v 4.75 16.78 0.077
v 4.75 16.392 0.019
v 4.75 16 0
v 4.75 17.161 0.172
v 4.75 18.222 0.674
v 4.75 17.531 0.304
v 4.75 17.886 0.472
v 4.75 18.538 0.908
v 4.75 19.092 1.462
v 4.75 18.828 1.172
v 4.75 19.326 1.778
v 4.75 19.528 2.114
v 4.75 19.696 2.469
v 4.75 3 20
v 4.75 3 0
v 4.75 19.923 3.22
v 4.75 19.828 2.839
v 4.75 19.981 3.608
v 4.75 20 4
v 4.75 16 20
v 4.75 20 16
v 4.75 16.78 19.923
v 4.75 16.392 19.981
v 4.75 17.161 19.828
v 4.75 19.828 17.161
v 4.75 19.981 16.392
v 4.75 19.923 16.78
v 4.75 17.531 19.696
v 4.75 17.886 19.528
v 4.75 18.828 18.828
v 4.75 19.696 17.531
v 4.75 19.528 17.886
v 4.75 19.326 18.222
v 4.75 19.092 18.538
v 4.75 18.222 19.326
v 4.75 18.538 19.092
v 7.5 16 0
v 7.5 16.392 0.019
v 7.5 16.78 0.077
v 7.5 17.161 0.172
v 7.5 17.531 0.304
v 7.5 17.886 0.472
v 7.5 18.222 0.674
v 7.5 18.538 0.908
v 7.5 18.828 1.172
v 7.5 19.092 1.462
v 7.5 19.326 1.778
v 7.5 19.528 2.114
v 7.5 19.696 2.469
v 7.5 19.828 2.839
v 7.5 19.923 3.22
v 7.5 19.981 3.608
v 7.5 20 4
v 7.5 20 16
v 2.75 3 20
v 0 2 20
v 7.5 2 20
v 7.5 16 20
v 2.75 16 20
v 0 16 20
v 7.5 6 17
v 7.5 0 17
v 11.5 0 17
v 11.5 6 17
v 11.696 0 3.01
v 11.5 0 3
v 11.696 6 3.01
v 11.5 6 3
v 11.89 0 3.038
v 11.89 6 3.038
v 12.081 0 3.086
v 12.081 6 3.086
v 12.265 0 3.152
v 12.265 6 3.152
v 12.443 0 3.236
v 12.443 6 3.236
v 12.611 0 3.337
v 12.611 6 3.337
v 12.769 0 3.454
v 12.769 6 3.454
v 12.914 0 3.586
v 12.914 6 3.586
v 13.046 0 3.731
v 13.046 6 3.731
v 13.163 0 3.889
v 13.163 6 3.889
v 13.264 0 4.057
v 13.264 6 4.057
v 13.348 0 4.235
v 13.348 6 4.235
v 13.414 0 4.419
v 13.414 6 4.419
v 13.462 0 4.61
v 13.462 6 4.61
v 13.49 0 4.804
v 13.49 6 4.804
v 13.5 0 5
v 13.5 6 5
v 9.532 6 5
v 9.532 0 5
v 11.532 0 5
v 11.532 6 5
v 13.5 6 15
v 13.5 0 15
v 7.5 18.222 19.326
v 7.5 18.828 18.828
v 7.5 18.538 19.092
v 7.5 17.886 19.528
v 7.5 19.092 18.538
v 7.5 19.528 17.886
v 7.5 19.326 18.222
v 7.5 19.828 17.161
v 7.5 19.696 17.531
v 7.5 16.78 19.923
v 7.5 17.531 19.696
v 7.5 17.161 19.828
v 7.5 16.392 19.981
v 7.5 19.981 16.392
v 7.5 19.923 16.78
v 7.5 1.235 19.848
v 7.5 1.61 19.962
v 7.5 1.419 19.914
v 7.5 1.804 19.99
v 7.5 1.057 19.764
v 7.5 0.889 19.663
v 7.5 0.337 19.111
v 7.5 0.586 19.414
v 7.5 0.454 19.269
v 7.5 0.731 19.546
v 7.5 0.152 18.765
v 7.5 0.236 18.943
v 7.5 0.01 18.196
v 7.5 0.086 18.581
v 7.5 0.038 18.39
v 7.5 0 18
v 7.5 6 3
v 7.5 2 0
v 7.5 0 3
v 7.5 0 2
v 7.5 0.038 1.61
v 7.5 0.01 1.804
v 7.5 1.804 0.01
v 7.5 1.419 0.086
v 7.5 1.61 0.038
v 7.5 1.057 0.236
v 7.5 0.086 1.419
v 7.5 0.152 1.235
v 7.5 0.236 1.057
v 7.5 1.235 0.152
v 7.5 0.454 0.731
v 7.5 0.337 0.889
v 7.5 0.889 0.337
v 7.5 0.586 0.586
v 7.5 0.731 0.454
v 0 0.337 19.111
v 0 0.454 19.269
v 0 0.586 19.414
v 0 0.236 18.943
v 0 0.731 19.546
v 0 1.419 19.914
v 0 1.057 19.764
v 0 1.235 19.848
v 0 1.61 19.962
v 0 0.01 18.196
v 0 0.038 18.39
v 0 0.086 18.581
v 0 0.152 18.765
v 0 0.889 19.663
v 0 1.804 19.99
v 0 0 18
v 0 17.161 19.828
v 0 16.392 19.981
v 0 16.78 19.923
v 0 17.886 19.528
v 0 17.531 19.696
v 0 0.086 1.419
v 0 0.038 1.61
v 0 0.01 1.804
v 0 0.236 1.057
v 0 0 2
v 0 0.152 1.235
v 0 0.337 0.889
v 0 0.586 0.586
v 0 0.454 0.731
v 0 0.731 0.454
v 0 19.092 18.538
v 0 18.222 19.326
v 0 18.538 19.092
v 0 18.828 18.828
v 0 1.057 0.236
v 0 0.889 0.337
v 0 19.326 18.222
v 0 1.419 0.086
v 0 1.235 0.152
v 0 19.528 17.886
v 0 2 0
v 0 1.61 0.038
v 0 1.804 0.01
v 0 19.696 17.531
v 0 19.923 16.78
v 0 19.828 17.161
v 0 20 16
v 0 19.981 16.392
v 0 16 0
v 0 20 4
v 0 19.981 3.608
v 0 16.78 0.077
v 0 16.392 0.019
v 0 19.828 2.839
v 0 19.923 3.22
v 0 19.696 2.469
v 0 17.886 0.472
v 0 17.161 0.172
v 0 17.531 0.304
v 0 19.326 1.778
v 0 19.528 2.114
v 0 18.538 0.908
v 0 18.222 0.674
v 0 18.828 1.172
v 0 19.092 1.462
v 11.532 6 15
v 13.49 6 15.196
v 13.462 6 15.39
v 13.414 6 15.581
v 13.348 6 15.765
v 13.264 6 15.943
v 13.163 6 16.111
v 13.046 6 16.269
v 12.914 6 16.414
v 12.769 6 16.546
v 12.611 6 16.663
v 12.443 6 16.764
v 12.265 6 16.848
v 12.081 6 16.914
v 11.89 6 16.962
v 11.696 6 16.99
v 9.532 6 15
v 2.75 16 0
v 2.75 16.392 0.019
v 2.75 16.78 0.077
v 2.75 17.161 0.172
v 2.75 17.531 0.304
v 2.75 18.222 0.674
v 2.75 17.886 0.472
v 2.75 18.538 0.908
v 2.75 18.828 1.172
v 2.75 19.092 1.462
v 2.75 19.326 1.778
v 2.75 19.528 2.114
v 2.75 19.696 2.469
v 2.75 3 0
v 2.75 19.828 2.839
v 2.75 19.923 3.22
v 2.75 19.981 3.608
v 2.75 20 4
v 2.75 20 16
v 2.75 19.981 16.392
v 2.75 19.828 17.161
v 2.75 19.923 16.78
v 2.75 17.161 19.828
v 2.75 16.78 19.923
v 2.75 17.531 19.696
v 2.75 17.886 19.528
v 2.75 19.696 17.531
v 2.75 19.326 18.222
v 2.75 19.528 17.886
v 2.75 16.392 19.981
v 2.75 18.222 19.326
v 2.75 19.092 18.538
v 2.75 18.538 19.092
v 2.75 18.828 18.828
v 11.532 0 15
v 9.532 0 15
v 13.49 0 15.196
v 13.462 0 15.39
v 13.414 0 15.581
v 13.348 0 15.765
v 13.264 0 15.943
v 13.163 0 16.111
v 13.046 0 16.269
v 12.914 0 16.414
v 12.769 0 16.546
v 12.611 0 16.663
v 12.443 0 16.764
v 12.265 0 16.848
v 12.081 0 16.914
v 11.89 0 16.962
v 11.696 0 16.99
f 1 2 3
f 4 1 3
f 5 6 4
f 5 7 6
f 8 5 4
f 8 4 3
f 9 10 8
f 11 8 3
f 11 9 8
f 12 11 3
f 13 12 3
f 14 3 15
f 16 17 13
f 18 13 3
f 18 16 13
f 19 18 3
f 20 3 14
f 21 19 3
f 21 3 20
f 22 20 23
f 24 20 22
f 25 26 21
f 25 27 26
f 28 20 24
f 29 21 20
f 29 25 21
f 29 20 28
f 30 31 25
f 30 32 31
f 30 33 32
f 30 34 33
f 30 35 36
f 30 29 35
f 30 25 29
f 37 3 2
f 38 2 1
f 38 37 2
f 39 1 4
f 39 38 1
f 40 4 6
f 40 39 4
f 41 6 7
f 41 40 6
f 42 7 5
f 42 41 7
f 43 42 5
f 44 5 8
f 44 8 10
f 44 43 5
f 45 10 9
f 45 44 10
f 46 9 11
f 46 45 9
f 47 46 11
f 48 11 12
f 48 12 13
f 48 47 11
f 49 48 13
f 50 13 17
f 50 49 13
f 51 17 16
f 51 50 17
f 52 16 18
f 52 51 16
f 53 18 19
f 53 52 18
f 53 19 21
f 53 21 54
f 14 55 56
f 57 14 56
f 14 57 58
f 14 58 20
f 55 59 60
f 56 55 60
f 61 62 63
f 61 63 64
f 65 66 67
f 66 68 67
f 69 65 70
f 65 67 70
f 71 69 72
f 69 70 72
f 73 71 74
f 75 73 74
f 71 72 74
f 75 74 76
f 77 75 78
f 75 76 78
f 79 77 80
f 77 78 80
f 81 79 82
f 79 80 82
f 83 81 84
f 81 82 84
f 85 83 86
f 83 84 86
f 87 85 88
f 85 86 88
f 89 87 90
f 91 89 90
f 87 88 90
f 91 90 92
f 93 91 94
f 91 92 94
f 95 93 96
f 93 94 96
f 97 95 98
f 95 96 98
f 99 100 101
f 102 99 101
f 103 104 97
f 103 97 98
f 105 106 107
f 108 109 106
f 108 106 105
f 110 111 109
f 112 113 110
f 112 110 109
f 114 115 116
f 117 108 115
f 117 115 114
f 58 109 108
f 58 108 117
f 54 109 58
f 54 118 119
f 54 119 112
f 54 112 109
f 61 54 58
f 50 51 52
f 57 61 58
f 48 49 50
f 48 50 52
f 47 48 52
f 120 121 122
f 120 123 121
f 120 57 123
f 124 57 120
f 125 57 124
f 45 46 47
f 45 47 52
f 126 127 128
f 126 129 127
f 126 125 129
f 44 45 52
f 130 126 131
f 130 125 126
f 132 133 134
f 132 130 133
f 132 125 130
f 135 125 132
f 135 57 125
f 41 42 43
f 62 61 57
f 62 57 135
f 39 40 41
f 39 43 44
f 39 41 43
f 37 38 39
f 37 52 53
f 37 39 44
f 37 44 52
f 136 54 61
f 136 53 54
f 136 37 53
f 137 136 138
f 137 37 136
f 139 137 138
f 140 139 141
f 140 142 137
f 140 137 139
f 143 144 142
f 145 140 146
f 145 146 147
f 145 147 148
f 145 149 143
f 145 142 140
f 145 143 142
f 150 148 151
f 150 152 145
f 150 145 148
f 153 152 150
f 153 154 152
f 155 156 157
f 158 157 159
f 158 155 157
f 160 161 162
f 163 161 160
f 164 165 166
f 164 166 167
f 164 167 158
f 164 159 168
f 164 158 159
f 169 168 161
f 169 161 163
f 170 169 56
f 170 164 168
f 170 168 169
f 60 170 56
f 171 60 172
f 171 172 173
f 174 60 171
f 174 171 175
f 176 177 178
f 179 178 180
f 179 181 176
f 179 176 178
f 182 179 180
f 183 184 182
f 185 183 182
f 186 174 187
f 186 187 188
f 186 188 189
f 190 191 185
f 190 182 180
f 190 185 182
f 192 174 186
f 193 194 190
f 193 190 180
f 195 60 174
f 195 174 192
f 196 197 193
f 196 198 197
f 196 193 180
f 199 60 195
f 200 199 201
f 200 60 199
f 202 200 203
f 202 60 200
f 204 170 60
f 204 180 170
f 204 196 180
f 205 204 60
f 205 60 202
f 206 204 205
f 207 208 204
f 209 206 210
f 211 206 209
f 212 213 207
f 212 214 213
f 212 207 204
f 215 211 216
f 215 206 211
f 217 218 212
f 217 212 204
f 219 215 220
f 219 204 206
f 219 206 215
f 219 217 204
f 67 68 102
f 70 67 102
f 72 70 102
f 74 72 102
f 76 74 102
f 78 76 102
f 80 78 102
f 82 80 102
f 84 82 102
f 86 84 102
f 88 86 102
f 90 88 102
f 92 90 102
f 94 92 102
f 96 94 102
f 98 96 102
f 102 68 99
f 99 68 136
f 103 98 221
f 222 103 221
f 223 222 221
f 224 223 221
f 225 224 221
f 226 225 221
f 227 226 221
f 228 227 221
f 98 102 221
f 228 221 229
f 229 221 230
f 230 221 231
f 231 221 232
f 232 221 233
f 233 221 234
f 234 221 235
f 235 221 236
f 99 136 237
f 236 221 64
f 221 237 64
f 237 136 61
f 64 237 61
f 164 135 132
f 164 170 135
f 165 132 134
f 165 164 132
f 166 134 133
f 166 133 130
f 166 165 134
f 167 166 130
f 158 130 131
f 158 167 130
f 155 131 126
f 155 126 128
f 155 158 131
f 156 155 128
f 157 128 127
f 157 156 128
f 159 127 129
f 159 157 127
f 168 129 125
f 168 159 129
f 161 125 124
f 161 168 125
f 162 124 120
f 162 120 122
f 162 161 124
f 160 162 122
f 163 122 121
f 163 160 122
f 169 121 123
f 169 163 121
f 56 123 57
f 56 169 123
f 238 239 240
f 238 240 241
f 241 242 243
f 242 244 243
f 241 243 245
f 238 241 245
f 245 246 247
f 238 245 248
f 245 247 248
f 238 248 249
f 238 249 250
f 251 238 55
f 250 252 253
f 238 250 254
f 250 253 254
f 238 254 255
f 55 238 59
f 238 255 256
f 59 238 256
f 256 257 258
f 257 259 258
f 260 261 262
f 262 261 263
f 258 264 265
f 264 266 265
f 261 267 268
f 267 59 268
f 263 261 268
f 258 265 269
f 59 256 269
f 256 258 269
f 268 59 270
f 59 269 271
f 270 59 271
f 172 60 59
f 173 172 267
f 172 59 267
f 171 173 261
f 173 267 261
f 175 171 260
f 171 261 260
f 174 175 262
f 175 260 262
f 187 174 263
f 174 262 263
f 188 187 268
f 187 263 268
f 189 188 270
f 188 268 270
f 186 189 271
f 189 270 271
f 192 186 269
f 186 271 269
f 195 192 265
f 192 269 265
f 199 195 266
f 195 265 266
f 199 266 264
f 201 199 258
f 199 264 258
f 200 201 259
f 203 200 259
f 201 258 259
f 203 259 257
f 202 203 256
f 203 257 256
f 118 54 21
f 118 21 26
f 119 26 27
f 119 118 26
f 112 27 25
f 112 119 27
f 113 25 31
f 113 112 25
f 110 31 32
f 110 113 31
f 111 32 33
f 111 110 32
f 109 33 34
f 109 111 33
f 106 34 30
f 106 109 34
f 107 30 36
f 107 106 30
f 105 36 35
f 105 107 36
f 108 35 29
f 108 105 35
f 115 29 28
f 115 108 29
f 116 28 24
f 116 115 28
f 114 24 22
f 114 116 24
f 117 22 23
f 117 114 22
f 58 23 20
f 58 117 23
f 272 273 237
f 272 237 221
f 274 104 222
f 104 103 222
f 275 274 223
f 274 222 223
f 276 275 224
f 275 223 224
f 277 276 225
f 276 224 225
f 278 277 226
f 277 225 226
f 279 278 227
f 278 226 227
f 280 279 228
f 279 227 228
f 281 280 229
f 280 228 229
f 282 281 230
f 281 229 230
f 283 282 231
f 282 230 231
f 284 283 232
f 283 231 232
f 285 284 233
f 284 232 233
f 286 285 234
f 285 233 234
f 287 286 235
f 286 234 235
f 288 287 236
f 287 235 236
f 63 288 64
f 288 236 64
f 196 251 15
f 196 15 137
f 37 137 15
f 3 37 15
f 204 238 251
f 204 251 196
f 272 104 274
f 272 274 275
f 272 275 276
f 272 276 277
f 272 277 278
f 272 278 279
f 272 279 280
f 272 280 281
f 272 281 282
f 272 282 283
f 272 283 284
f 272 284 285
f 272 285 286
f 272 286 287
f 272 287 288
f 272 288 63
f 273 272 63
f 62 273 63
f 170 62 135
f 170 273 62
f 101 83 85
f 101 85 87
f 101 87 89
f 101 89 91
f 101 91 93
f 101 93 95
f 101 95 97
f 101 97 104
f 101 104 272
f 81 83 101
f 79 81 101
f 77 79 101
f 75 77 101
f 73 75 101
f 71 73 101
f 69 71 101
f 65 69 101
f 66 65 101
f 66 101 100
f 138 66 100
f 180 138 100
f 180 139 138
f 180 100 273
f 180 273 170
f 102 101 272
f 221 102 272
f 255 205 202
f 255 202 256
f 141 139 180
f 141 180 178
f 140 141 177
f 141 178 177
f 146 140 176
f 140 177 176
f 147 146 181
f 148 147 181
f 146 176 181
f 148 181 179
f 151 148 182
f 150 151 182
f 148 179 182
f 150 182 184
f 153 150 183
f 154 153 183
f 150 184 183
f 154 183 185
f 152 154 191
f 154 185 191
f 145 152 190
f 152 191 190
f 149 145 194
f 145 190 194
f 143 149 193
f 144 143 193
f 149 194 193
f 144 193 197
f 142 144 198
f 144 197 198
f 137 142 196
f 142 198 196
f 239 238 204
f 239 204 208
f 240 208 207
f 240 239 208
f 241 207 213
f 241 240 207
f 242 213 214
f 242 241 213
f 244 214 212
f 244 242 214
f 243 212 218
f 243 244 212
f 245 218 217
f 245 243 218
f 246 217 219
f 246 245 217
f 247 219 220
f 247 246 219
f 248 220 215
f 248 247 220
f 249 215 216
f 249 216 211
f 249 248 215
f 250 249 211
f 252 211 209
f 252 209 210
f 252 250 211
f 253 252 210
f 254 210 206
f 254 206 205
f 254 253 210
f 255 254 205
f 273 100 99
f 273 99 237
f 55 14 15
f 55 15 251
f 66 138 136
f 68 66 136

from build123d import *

# Parameters (mm, degrees)
PAD_DEPTH       = 20
SKETCH001_W     = 6
SKETCH001_H     = 14
PAD001_DEPTH    = 6
SKETCH002_W     = 2
SKETCH002_H     = 10
POCKET_DEPTH    = 10
FILLET_R        = 2
FILLET001_R     = 2
FILLET002_R     = 4
SKETCH003_W     = 2
SKETCH003_H     = 20
POCKET001_DEPTH = 17


with BuildPart() as part:
    # Sketch → Pad (new body)
    with BuildSketch(Plane.XY):
        Polygon((0, 0), (0, 20), (3, 20), (3, 3), (4.5, 3), (4.5, 20), (7.5, 20), (7.5, 0), align=None)
    extrude(amount=PAD_DEPTH)

    # Sketch001 (on Face7 of Pad) → Pad001 (join)
    with BuildSketch(Plane.YZ.offset(7.5)):
        with Locations((3, 10)):
            Rectangle(SKETCH001_W, SKETCH001_H)
    extrude(amount=PAD001_DEPTH)

    # Sketch002 (on Face7 of Pad001) → Pocket (cut)
    with BuildSketch(Plane.XZ):
        with Locations((10.531835, 10)):
            Rectangle(SKETCH002_W, SKETCH002_H)
    extrude(amount=-POCKET_DEPTH, mode=Mode.SUBTRACT)

    # Fillet
    fillet_edges = [part.edges().sort_by_distance(p)[0] for p in [
        (3.75, 0, 20),
        (3.75, 0, 0),
    ]]
    fillet(fillet_edges, radius=FILLET_R)

    # Fillet001
    fillet001_edges = [part.edges().sort_by_distance(p)[0] for p in [
        (13.5, 3, 17),
        (13.5, 3, 3),
    ]]
    fillet(fillet001_edges, radius=FILLET001_R)

    # Fillet002
    fillet002_edges = [part.edges().sort_by_distance(p)[0] for p in [
        (1.5, 20, 20),
        (6, 20, 20),
        (6, 20, 0),
        (1.5, 20, 0),
    ]]
    fillet(fillet002_edges, radius=FILLET002_R)

    # Sketch003 (on DatumPlane) → Pocket001 (cut)
    with BuildSketch(Plane(origin=(0, 20, 0), x_dir=(-1, 0, 0), z_dir=(0, 1, 0))):
        with Locations((-3.75, 10)):
            Rectangle(SKETCH003_W, SKETCH003_H)
    extrude(amount=-POCKET001_DEPTH, mode=Mode.SUBTRACT)


solid = part.part
